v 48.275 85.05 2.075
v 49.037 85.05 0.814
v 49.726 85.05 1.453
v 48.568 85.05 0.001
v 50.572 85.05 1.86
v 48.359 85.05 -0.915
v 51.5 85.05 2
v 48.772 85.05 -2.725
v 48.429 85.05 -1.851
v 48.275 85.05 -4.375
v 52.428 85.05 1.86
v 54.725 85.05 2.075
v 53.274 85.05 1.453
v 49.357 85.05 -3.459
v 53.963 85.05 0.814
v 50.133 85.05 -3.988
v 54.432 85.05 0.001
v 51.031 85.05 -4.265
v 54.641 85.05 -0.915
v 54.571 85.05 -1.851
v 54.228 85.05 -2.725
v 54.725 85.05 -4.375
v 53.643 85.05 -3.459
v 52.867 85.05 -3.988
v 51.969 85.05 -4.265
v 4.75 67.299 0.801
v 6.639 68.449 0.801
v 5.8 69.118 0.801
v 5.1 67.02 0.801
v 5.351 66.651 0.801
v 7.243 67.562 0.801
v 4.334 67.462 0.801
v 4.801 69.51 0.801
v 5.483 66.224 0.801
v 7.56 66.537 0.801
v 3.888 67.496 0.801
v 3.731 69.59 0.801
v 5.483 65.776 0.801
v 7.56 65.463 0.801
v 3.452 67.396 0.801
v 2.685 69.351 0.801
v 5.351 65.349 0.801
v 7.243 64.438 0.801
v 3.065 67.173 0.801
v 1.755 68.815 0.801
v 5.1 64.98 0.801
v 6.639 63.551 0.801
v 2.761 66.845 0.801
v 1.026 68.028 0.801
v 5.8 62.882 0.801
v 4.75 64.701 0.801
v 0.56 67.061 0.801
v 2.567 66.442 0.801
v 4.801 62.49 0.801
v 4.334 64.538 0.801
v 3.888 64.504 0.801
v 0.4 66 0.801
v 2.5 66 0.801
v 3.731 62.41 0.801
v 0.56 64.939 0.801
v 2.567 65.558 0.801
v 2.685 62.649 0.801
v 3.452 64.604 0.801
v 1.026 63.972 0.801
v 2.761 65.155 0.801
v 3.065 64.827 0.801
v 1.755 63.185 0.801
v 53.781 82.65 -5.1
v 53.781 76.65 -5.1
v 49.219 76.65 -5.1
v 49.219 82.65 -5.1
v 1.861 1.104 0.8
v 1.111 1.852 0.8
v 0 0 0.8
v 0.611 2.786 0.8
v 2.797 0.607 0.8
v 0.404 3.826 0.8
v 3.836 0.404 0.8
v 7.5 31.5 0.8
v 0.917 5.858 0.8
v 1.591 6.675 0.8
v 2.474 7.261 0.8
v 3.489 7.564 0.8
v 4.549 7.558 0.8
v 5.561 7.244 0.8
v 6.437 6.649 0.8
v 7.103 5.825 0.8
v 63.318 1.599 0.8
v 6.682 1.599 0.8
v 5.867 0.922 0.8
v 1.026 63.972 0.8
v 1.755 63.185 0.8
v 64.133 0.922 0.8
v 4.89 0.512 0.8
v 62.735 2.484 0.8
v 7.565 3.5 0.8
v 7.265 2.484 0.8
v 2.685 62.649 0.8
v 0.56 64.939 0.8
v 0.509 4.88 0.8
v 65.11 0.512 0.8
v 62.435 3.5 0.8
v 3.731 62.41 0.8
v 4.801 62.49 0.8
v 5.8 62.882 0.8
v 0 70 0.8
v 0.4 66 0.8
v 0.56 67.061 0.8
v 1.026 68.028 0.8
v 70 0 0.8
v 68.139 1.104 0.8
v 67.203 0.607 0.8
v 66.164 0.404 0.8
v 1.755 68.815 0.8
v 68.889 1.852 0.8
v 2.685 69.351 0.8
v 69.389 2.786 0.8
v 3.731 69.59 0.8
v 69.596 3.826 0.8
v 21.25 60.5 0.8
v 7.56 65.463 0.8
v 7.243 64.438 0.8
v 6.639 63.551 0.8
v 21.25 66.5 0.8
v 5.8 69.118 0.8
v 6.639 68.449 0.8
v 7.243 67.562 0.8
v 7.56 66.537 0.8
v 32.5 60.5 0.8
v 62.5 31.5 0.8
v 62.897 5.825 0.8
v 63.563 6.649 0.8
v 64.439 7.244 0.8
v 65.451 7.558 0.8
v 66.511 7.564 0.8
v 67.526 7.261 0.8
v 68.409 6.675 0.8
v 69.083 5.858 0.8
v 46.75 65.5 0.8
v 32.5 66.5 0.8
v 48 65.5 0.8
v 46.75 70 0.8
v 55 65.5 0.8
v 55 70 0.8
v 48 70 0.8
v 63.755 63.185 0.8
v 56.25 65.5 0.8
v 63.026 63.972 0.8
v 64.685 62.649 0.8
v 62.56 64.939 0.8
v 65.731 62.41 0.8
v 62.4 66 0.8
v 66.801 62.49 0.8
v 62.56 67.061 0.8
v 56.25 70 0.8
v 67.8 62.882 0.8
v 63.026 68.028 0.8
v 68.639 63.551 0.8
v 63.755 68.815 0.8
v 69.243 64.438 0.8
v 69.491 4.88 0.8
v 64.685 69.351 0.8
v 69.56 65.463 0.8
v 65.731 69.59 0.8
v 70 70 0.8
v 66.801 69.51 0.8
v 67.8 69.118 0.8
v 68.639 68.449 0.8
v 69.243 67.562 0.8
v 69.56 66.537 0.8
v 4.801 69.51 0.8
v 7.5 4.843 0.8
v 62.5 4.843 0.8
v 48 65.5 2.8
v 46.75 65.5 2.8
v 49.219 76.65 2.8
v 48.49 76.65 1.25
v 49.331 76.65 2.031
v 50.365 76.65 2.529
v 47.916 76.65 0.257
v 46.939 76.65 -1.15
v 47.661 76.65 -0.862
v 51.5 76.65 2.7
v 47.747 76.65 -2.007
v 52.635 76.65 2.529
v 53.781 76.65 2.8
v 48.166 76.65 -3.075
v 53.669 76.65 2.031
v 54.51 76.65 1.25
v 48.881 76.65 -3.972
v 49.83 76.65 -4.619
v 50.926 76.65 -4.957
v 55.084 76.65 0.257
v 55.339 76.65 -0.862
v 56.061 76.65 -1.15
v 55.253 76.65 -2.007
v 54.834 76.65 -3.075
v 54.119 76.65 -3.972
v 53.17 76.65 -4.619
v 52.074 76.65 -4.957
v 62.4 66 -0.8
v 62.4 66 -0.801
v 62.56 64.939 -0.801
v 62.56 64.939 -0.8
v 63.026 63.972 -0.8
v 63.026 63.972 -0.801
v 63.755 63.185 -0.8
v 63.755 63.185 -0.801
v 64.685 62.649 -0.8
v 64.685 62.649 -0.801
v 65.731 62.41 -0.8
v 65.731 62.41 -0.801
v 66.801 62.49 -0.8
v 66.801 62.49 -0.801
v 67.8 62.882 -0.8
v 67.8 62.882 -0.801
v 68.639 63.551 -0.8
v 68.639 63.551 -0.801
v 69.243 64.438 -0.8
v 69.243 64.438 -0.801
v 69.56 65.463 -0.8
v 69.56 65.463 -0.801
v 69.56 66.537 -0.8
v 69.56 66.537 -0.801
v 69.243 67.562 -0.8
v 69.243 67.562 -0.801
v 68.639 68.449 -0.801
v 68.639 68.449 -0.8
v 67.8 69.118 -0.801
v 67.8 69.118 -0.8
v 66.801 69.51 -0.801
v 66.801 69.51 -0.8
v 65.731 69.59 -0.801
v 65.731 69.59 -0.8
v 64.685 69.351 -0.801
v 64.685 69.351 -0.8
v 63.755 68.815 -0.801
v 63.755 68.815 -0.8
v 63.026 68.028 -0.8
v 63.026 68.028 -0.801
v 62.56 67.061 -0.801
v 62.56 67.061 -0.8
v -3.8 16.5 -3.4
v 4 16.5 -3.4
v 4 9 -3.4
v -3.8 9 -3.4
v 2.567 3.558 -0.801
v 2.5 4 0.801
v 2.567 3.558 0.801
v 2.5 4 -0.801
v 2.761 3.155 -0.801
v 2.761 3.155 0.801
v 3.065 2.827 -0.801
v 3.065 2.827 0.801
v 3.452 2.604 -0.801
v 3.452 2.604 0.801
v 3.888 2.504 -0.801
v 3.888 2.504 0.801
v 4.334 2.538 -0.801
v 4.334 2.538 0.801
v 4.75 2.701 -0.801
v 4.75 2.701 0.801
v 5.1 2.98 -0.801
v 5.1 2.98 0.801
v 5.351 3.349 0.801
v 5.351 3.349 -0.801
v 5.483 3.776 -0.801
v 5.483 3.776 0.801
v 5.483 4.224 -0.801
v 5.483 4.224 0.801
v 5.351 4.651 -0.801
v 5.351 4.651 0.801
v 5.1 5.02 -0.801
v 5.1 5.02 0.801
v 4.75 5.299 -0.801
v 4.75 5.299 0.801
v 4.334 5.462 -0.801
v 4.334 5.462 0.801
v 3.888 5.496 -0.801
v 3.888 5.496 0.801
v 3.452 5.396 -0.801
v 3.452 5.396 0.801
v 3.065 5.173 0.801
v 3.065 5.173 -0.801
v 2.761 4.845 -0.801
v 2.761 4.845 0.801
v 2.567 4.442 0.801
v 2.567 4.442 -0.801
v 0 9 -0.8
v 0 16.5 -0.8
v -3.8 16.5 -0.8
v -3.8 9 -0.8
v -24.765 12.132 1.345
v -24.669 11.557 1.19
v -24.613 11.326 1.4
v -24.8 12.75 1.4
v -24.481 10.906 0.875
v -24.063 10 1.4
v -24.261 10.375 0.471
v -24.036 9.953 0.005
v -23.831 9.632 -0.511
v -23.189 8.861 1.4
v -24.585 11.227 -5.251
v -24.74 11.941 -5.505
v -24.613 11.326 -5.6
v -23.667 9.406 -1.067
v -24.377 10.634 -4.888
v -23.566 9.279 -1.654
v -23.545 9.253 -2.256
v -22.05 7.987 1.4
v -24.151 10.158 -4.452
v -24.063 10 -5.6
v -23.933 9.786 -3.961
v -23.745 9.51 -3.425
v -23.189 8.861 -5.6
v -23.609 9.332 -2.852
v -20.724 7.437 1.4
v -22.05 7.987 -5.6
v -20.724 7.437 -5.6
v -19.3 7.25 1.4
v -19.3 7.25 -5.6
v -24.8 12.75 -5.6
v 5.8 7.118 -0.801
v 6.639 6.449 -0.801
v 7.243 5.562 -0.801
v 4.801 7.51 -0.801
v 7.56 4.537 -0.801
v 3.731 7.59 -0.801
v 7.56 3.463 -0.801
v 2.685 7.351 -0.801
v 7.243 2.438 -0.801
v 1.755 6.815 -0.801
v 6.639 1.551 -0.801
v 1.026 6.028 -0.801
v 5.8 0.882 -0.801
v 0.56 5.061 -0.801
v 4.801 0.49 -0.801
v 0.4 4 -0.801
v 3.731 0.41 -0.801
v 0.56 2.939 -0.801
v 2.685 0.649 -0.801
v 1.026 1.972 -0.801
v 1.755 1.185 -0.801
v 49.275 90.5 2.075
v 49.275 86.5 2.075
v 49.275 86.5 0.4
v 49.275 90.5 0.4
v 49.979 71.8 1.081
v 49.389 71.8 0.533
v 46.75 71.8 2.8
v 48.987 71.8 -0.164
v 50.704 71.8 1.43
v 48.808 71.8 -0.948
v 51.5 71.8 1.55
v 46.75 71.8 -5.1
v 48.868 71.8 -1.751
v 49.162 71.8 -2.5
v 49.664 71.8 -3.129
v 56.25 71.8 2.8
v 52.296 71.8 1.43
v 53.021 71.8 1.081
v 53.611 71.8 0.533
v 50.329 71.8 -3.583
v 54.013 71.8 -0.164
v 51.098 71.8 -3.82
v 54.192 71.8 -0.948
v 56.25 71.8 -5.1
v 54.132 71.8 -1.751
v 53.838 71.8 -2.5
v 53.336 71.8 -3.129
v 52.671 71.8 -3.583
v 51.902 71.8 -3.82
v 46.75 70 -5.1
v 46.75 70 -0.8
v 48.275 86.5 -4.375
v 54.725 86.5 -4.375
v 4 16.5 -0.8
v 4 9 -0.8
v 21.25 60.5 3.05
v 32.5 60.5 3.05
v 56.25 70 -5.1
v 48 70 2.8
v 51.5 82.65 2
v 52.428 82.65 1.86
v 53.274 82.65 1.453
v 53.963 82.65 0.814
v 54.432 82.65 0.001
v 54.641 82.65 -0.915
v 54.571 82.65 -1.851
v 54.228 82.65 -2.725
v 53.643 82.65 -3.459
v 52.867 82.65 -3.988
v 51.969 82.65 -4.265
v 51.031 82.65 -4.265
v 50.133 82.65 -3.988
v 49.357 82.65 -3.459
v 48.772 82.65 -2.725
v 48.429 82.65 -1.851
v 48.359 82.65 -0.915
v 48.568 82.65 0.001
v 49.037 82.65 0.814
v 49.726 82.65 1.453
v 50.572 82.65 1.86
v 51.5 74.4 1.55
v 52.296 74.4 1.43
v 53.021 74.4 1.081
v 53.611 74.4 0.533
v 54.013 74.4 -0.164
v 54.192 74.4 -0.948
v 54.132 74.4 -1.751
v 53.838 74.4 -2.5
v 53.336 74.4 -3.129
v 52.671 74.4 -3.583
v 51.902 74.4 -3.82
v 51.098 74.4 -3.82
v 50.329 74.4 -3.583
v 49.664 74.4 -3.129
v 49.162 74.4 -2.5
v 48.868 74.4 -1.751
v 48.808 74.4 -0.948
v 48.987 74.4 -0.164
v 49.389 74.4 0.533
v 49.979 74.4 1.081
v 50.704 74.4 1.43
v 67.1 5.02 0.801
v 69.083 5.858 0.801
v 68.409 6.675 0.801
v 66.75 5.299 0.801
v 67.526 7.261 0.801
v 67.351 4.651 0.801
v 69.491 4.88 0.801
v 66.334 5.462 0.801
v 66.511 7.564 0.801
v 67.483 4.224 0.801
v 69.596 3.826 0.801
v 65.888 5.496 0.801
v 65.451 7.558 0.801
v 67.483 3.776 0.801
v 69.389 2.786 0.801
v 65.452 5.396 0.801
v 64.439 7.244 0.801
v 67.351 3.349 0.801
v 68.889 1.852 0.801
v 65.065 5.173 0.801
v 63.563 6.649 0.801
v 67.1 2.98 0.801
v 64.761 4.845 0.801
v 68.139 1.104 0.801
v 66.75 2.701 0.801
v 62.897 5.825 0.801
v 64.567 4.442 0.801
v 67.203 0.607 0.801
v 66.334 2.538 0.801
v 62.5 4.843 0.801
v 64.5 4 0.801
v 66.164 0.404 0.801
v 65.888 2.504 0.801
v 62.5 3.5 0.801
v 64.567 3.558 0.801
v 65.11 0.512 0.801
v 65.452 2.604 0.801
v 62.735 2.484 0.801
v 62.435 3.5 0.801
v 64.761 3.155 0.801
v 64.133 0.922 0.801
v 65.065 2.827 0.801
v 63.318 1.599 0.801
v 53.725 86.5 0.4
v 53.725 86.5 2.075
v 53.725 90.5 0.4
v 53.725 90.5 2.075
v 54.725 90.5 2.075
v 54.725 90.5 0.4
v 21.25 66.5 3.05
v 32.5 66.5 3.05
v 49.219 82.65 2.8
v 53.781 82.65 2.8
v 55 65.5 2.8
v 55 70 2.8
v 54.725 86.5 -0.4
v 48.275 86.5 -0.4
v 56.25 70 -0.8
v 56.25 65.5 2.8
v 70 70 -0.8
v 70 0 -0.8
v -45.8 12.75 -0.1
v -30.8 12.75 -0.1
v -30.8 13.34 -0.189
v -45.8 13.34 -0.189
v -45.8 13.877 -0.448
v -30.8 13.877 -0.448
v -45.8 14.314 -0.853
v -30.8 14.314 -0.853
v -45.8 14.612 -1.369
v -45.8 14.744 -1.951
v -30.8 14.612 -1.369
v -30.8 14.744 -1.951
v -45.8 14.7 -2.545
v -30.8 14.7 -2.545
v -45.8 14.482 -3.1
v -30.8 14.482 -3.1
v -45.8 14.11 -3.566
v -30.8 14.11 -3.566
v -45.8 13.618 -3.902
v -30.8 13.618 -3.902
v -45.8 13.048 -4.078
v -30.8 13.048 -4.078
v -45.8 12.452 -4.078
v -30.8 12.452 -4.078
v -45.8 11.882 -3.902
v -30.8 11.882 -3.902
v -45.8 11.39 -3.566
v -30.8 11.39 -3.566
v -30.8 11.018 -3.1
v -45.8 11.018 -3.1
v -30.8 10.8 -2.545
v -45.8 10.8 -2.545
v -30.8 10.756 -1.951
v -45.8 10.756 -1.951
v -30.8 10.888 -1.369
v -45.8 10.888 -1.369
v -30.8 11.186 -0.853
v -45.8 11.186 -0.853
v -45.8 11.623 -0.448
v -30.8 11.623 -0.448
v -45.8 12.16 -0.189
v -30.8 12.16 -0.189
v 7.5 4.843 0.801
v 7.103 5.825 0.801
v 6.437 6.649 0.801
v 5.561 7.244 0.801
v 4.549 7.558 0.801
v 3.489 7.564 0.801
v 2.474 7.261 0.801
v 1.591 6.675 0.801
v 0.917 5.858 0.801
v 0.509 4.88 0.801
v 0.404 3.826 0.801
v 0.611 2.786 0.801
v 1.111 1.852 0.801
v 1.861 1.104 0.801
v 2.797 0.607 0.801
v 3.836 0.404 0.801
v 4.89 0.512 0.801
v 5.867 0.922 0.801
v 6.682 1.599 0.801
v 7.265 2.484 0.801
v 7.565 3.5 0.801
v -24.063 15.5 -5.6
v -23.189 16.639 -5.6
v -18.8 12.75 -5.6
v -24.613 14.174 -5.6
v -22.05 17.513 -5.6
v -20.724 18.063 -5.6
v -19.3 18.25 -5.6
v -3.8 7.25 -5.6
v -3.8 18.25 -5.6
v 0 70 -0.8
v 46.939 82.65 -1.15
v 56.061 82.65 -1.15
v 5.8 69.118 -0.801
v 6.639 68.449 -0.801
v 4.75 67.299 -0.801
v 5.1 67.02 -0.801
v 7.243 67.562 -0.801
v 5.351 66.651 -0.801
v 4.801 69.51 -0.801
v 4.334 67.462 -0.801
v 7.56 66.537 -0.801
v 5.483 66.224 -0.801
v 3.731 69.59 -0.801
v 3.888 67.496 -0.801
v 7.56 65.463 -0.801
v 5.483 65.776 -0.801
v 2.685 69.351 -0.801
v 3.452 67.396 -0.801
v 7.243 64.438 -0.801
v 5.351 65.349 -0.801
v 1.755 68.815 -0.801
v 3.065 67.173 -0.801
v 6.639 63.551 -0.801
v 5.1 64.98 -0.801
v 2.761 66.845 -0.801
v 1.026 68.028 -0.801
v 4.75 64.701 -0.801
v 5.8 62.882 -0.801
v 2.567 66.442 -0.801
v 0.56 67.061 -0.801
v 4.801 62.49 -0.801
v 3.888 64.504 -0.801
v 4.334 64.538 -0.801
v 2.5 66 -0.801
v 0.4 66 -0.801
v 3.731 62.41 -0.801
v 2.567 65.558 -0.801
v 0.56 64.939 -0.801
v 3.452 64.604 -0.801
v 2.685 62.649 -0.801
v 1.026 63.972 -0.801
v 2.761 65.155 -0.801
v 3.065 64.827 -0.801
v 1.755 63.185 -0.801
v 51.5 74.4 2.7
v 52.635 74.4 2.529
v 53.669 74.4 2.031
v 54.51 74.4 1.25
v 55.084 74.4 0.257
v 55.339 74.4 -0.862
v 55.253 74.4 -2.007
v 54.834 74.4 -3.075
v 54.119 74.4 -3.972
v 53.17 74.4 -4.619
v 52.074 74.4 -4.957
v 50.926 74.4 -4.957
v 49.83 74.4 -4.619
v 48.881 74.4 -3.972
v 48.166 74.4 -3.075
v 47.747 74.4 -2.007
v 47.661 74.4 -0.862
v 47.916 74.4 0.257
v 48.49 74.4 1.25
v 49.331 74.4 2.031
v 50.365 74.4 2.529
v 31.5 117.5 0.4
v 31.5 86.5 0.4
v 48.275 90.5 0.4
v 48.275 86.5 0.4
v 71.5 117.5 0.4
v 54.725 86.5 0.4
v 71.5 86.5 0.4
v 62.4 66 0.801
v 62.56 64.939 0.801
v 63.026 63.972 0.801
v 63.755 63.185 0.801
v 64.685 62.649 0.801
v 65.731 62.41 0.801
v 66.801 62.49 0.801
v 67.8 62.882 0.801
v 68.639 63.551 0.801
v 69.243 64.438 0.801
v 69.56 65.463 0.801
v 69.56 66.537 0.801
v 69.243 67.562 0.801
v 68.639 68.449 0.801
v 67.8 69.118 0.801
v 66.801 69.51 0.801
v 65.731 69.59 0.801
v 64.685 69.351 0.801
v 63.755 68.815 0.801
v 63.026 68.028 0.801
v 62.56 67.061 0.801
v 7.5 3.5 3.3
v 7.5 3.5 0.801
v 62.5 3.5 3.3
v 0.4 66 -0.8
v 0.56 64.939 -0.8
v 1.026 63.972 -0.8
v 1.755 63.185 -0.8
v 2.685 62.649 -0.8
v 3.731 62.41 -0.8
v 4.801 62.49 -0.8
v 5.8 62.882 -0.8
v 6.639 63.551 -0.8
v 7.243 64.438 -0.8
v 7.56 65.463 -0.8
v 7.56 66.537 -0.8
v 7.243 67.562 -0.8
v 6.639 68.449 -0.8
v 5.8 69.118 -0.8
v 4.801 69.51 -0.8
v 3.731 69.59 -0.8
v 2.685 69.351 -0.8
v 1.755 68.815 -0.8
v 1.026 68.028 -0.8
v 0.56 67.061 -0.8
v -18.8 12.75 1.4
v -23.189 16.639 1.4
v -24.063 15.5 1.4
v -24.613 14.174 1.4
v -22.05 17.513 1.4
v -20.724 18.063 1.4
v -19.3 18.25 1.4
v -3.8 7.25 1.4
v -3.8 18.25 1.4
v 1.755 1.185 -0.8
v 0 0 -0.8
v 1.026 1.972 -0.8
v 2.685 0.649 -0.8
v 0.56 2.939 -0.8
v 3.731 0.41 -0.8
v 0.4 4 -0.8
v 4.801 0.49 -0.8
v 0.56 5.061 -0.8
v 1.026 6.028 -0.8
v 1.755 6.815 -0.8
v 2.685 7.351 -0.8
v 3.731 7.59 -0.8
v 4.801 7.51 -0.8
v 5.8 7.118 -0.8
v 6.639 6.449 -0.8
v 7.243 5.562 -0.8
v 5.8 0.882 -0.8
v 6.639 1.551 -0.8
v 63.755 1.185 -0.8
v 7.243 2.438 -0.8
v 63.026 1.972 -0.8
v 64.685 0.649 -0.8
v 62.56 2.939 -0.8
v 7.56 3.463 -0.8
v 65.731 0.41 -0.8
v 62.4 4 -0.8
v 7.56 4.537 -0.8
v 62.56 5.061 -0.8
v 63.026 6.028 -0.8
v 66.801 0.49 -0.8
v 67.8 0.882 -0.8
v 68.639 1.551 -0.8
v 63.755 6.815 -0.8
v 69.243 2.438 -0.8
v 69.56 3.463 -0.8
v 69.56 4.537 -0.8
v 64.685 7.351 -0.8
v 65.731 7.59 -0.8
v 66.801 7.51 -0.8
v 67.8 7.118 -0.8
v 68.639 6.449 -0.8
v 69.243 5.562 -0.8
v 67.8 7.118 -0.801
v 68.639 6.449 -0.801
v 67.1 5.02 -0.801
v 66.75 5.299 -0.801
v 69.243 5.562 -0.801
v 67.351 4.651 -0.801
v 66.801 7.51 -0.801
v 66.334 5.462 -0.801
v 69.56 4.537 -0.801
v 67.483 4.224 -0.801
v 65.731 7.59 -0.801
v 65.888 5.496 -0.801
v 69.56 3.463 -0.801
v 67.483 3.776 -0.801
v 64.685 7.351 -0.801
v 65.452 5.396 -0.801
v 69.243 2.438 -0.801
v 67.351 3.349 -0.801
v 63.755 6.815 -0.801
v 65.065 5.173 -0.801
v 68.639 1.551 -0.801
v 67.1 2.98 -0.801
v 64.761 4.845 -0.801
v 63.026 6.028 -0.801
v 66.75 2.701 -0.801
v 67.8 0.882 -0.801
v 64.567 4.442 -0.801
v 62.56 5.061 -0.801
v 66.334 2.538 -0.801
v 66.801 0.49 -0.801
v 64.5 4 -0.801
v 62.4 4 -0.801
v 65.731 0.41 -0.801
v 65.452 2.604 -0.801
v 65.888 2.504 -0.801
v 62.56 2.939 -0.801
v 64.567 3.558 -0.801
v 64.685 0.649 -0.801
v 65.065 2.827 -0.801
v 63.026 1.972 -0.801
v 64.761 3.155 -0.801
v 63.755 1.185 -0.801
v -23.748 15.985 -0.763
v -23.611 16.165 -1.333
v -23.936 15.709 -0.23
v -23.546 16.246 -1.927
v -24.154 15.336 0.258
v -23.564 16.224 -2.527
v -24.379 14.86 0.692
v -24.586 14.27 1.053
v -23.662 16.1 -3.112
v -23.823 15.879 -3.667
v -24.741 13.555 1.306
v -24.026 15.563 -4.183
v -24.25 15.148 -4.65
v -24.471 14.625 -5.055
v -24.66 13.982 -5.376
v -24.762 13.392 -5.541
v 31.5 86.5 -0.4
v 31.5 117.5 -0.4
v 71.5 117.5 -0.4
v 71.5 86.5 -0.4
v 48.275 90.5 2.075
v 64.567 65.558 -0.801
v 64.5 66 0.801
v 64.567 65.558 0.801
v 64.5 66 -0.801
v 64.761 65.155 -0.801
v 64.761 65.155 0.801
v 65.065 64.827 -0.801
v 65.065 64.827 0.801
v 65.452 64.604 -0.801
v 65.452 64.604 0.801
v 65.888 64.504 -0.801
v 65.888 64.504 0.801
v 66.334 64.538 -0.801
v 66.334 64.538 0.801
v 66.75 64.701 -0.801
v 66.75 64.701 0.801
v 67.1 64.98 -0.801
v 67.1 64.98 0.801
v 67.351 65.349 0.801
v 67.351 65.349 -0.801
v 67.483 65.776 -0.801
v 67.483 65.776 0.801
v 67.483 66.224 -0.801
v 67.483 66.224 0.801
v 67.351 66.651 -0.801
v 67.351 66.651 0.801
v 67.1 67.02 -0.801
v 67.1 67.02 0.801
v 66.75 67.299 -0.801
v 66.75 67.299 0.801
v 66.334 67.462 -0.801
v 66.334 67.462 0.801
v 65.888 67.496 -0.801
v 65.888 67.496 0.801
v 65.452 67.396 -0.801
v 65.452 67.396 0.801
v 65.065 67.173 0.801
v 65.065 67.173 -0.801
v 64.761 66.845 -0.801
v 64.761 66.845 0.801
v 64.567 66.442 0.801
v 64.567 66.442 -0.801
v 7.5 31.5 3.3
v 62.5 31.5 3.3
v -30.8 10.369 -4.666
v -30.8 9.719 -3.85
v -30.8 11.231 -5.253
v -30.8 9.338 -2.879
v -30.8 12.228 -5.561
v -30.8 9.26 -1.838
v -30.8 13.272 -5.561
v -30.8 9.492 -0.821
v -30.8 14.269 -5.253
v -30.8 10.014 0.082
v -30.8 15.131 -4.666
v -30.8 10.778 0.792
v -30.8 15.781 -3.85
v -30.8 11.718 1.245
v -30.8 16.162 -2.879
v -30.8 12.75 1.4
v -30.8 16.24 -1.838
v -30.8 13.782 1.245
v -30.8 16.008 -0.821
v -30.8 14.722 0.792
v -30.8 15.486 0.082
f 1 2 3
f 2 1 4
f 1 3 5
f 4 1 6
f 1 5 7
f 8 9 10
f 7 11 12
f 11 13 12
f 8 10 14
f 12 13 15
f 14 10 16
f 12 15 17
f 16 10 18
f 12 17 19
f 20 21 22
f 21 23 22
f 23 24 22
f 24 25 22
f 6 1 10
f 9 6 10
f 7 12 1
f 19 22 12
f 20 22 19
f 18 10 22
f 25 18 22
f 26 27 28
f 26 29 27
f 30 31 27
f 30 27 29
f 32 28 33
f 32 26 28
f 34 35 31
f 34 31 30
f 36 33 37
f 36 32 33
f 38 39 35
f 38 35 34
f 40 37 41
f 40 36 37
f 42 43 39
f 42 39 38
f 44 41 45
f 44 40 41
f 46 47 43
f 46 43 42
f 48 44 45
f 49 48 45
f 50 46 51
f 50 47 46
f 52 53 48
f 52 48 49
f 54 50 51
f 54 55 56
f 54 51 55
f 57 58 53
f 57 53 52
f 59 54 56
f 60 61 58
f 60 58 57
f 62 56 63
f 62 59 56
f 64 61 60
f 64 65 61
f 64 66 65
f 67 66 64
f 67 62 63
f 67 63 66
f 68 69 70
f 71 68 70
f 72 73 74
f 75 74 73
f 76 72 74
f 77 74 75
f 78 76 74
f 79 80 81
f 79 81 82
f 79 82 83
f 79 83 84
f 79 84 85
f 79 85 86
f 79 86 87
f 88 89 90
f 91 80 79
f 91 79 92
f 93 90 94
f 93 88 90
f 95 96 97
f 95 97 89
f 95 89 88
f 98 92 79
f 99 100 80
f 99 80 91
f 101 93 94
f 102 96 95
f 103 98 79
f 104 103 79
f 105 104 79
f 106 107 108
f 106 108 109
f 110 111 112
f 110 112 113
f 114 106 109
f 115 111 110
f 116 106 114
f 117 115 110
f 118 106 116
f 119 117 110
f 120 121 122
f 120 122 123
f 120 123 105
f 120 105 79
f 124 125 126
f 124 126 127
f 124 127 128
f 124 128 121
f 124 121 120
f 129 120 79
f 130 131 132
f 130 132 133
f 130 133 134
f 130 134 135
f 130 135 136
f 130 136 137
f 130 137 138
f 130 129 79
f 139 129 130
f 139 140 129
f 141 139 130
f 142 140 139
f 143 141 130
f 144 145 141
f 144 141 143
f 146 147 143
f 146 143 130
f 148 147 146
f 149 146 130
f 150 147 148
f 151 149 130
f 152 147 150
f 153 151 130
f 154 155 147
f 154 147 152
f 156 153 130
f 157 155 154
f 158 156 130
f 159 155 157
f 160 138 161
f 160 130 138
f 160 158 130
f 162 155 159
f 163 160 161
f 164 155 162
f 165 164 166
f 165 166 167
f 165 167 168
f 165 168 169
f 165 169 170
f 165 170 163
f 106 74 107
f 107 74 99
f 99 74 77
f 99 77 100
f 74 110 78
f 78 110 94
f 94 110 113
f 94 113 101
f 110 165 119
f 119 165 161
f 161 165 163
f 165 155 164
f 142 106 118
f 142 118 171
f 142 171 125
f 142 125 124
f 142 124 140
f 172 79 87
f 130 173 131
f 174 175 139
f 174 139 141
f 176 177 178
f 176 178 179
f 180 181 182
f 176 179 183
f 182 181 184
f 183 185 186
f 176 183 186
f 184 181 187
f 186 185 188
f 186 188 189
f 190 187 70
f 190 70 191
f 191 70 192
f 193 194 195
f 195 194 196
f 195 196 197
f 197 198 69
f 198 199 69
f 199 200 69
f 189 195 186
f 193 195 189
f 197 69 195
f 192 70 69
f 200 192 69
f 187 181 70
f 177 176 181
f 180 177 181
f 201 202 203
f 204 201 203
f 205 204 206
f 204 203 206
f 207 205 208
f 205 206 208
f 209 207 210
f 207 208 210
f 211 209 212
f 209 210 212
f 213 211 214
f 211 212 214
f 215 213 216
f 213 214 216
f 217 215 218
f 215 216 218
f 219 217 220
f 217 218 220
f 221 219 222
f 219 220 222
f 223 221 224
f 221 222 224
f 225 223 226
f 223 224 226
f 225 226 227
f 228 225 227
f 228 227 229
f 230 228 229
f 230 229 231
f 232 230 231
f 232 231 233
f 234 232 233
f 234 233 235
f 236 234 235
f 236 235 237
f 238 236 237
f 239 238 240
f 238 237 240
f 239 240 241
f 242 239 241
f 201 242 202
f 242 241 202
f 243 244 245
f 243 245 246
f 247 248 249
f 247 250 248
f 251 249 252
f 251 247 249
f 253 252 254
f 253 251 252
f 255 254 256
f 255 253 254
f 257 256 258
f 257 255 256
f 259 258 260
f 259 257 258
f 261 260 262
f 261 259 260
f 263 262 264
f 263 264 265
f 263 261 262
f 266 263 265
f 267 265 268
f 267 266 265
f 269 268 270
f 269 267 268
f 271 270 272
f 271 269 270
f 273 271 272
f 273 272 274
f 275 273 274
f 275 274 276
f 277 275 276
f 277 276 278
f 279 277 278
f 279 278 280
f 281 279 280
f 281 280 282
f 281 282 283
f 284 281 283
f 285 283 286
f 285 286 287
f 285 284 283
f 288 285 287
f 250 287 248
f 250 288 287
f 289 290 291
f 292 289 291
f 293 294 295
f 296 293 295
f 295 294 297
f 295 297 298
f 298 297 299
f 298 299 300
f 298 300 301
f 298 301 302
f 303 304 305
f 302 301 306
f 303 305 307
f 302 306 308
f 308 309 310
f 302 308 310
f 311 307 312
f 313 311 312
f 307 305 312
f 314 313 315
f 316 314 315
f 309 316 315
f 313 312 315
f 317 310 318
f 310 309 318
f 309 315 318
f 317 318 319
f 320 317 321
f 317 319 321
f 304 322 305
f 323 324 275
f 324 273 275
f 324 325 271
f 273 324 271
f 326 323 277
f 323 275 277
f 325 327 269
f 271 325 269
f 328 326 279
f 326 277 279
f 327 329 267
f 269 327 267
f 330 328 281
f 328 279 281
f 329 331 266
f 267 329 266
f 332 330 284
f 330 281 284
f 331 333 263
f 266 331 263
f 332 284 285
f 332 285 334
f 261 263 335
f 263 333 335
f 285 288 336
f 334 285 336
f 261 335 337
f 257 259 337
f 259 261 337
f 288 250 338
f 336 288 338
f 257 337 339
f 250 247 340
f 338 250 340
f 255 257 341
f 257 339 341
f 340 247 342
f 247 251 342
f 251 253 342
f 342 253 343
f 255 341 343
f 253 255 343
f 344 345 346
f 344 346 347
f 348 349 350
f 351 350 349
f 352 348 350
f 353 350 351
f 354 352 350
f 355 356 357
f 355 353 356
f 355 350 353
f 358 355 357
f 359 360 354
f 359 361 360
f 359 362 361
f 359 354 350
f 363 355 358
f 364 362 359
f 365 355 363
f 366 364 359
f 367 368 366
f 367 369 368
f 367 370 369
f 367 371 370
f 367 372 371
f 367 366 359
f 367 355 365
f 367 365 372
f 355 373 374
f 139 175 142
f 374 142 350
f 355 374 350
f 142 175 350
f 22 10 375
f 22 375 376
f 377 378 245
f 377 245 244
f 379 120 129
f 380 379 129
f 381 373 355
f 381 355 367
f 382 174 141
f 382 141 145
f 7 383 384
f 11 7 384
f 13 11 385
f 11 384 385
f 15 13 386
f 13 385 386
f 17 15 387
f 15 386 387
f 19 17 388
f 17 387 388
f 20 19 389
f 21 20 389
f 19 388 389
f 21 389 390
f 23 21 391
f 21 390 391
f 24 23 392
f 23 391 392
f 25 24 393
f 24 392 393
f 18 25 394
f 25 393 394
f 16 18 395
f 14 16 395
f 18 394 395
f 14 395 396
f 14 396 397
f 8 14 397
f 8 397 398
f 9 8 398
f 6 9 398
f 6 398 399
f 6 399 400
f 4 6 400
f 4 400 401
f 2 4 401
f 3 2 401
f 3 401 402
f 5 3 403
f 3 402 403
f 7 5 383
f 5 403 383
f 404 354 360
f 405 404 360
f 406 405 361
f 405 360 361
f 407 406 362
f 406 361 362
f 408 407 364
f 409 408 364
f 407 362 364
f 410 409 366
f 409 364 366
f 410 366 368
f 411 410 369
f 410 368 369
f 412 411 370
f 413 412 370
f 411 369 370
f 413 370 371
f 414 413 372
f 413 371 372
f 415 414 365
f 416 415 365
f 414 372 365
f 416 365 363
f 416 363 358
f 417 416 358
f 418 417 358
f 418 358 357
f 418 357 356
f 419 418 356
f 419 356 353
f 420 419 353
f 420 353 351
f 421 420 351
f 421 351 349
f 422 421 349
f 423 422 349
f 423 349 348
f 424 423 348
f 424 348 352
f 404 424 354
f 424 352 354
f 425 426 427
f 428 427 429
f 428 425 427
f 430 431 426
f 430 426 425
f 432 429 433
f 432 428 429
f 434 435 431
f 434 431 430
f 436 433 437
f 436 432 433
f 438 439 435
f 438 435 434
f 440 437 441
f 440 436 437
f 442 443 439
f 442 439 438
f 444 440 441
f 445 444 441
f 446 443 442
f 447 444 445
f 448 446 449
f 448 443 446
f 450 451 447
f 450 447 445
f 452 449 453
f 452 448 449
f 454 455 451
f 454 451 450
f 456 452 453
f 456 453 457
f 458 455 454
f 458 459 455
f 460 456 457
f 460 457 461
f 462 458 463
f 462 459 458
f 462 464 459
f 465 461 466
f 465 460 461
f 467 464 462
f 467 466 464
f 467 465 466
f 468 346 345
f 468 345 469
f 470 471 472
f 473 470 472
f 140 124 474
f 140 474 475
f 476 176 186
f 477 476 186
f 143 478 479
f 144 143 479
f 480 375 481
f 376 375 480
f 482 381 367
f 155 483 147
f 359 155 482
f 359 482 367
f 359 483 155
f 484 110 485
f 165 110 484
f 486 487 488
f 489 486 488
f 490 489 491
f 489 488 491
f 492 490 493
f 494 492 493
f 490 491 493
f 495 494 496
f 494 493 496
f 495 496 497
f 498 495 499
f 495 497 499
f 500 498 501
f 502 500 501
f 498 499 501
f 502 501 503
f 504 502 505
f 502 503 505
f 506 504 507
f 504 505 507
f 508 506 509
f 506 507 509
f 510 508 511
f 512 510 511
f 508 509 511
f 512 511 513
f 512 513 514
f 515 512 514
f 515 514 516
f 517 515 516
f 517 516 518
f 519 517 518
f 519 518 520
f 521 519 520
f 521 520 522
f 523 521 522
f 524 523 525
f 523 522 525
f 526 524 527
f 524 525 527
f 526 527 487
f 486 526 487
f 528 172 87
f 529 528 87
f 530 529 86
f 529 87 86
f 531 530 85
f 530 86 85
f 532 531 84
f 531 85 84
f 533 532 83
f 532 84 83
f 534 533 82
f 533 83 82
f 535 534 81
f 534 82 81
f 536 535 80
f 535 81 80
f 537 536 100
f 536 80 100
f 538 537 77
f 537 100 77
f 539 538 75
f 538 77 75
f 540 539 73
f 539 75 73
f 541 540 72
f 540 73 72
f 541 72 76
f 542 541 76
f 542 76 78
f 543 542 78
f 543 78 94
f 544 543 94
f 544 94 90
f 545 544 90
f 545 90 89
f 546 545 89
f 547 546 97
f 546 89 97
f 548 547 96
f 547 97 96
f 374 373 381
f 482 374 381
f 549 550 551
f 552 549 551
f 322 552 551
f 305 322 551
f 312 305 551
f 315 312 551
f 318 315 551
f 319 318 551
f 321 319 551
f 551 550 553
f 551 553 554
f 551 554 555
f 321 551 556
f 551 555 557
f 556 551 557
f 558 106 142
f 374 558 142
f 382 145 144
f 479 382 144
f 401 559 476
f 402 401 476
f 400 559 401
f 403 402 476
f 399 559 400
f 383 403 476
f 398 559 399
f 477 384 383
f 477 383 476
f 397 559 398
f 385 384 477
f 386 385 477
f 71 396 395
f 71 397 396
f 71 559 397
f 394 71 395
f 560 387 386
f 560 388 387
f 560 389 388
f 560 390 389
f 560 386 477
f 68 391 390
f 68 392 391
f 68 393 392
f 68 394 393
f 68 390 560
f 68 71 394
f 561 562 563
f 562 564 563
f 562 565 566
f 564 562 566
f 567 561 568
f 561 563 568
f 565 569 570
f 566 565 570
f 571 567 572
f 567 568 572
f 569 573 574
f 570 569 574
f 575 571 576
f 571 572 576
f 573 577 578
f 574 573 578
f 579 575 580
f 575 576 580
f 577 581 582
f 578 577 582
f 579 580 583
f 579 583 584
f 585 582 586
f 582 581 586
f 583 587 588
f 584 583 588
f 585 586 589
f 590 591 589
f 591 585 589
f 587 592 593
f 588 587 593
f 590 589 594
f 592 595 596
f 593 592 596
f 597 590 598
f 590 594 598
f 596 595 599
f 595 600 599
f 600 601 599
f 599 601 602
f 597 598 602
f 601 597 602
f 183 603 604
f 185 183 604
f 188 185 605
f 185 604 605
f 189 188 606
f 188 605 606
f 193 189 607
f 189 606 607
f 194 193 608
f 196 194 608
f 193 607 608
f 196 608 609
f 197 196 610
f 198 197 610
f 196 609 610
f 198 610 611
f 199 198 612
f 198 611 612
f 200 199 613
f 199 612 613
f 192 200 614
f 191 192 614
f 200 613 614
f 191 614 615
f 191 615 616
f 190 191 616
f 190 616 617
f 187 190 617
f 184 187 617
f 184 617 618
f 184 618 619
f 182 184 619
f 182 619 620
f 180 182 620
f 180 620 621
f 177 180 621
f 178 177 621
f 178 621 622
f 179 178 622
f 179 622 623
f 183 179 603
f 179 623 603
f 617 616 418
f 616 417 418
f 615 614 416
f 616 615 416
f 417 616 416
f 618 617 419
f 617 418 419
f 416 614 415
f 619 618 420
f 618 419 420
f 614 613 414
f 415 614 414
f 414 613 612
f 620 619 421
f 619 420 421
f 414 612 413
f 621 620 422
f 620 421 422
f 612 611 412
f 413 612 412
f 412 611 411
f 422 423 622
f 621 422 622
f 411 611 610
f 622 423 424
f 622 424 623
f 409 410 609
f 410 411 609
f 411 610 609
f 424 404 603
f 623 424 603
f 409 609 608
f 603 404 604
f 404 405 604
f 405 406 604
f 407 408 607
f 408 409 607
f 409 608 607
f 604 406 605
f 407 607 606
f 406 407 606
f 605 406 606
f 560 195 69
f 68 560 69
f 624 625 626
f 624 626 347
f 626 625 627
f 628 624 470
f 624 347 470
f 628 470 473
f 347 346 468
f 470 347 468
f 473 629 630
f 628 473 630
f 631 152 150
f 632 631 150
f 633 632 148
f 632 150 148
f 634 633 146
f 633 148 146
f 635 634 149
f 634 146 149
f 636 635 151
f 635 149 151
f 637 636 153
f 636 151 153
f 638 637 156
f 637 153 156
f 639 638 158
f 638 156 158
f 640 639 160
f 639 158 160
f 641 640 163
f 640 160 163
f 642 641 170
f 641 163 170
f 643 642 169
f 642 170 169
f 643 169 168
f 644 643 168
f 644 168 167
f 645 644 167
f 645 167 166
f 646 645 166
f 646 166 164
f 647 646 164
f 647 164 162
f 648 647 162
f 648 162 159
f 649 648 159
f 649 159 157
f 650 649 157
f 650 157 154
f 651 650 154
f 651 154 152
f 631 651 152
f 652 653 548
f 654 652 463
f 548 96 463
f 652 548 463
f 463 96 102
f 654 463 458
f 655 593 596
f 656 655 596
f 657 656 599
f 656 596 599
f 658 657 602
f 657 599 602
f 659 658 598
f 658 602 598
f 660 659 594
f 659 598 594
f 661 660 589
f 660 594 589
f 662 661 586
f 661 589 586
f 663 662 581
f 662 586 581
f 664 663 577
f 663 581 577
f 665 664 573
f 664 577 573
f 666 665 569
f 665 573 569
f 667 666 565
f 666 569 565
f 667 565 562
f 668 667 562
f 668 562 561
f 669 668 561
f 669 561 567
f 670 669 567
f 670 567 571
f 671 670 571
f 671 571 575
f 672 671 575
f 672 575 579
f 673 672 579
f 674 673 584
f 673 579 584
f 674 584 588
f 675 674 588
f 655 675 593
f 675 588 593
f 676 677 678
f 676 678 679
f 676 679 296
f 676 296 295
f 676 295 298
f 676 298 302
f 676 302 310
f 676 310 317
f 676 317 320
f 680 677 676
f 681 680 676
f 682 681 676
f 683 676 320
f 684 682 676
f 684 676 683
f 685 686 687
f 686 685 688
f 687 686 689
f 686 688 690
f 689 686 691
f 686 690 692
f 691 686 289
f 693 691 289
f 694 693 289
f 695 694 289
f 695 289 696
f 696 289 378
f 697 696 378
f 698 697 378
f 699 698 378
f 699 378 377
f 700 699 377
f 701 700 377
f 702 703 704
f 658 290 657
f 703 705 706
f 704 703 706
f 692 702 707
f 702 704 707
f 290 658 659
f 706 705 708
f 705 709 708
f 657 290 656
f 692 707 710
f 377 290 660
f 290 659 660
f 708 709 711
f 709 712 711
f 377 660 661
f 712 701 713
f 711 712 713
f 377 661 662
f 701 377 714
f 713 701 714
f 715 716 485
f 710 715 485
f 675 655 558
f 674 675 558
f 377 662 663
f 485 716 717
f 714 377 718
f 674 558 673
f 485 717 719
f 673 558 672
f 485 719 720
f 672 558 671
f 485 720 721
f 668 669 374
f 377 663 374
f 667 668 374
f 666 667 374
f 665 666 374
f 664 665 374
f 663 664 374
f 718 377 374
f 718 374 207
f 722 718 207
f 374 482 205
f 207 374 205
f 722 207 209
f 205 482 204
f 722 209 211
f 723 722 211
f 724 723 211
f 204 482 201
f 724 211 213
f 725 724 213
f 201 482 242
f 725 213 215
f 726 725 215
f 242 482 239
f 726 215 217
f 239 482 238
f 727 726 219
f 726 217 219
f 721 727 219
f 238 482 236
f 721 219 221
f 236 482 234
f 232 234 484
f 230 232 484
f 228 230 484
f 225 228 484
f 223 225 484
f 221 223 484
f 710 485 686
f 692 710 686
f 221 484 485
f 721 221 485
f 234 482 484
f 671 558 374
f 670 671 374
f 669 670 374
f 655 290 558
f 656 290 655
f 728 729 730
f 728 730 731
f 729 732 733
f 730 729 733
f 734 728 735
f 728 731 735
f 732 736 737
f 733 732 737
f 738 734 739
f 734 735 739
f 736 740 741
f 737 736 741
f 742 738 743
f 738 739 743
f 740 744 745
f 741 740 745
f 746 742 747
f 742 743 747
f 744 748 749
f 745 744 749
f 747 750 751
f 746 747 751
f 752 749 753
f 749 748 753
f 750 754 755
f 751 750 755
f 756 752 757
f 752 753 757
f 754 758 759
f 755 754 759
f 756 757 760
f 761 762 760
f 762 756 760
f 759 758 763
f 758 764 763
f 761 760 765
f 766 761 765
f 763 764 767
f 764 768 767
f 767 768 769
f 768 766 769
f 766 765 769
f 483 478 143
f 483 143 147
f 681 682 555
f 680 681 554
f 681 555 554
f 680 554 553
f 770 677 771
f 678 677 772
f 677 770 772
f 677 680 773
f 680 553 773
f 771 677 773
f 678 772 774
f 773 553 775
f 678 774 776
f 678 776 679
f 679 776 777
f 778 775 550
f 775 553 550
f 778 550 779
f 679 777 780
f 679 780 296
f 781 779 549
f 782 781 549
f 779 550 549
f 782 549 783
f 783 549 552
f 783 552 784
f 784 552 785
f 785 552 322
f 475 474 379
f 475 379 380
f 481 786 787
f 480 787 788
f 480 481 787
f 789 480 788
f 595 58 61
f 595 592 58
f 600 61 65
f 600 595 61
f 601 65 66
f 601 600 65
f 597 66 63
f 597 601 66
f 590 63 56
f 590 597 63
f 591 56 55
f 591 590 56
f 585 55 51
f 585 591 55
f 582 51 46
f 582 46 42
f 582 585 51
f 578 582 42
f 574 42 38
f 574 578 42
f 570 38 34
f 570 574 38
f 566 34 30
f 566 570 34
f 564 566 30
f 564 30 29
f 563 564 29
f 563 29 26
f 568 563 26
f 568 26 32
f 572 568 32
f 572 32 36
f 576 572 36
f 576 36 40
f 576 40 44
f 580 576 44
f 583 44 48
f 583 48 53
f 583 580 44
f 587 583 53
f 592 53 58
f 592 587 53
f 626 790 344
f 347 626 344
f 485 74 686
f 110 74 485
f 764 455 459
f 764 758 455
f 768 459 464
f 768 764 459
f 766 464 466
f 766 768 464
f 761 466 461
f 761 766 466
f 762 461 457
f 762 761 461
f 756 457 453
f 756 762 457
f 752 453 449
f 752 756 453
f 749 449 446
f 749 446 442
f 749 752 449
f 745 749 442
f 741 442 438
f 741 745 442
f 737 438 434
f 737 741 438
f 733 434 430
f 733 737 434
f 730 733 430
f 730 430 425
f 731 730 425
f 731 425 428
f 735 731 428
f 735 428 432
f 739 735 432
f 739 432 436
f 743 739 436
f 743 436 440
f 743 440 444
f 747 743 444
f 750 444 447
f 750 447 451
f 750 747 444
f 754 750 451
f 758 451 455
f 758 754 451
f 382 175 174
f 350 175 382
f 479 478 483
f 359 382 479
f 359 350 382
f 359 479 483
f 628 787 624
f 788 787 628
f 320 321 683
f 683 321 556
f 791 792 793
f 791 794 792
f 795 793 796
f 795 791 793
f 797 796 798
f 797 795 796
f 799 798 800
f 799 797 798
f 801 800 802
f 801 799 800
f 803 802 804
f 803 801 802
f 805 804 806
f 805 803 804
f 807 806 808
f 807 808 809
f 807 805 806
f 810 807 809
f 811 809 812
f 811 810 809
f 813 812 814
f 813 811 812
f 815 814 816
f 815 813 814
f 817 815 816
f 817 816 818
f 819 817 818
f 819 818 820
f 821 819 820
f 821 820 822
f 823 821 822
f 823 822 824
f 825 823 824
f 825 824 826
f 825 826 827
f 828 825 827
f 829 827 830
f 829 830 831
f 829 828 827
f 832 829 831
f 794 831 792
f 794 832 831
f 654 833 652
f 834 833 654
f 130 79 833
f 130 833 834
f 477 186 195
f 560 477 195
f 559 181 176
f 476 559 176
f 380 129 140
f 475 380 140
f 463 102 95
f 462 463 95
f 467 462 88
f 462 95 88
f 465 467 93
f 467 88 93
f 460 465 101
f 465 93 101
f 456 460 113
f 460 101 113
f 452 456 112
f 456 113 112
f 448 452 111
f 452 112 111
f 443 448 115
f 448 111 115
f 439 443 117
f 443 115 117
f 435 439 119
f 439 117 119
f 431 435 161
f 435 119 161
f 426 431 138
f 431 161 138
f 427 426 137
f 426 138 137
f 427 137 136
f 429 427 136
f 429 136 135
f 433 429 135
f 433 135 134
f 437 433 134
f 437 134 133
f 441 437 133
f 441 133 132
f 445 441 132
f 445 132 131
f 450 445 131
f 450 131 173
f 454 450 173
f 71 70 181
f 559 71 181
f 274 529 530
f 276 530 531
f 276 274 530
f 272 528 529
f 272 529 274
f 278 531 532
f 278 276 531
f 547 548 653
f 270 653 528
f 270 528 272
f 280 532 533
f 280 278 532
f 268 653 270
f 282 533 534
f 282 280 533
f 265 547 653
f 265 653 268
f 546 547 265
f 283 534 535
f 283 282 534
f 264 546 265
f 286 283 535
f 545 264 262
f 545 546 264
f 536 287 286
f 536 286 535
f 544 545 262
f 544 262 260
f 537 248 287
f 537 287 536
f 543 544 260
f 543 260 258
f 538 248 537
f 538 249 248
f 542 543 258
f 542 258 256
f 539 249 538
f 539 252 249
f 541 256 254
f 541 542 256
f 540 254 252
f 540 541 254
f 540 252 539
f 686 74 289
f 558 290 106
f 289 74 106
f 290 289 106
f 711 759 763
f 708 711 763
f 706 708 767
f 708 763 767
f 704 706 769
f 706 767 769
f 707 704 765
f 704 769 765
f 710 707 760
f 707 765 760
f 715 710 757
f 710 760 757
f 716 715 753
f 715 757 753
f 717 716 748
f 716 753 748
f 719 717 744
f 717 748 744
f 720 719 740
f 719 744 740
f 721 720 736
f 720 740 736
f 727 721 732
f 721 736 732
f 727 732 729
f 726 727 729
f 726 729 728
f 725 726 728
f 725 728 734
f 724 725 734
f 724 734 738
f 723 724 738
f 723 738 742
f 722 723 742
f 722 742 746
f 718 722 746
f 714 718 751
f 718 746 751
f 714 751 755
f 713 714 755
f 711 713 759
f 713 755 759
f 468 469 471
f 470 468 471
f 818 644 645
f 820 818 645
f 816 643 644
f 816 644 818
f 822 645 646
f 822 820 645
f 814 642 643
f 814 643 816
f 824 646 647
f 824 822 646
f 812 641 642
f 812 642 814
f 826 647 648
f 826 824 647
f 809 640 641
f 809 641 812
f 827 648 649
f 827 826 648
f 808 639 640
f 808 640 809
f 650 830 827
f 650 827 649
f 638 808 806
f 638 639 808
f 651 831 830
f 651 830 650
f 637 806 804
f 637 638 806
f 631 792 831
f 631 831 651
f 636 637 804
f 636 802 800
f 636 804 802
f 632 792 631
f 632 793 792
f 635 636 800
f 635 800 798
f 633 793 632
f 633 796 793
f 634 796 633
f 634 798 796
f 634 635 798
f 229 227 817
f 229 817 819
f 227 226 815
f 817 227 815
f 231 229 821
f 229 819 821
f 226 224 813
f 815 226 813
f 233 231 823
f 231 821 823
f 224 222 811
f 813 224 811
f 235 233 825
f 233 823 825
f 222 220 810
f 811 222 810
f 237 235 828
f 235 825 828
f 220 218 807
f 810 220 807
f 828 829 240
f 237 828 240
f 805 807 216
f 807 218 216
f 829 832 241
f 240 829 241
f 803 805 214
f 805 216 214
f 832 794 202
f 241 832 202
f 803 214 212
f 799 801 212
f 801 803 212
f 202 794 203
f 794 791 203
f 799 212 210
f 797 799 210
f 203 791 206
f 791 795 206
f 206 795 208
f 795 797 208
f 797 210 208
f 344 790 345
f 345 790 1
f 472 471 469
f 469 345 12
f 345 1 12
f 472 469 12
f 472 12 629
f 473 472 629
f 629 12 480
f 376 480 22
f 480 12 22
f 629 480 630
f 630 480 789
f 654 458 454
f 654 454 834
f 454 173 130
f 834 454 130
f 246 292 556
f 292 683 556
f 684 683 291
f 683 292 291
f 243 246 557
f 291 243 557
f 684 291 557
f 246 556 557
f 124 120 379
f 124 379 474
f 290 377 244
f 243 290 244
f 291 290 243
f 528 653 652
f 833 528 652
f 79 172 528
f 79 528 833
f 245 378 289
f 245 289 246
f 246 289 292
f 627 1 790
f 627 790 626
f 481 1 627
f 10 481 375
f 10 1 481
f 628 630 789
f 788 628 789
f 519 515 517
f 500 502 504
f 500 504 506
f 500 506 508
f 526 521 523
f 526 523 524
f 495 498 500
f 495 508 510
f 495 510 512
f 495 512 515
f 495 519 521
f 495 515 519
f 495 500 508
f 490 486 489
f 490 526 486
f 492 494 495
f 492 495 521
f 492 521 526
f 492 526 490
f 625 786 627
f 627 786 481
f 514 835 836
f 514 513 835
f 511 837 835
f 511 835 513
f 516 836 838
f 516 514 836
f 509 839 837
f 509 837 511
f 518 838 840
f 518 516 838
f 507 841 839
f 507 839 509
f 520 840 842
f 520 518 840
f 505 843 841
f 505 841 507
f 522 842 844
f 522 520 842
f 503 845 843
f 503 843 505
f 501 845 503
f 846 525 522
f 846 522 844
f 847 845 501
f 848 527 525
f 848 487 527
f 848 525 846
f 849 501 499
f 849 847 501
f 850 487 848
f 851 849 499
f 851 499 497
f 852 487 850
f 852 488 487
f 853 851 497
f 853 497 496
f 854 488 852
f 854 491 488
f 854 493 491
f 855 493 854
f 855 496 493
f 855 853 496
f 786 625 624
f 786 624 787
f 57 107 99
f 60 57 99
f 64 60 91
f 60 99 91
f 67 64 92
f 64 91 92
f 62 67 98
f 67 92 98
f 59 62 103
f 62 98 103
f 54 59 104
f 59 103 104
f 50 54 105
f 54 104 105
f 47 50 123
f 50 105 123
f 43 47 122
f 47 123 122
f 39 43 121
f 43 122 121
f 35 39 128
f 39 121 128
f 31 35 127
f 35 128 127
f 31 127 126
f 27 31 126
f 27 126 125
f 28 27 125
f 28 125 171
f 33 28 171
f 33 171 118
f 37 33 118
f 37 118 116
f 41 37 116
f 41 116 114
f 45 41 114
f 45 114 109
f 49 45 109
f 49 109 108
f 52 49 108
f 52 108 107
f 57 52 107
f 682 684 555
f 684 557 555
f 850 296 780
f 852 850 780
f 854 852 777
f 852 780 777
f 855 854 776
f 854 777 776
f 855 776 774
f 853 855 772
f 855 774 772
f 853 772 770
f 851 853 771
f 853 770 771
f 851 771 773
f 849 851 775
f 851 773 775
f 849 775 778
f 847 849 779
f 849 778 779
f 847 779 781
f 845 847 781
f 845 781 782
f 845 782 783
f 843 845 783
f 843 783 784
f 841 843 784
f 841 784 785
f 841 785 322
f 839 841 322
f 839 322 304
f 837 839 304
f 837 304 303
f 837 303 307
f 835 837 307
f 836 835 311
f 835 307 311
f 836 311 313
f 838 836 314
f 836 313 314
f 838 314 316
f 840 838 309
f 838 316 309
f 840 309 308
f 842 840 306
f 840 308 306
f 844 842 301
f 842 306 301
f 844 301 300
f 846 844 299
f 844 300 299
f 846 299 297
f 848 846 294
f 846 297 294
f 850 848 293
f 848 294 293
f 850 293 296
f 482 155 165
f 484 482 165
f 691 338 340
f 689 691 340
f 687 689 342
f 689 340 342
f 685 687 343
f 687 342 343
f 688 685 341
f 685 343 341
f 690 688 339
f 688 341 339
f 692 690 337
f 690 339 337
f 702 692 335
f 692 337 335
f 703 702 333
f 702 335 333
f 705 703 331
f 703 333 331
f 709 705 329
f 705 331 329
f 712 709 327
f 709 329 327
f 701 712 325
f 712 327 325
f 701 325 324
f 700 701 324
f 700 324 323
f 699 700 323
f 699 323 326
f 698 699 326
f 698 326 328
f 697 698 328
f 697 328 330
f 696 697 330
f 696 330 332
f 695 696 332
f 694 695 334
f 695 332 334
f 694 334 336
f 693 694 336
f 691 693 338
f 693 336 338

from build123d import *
from build123d.topology import SkipClean

# Parameters (mm, degrees)
SKETCH1_W                     = 70
SKETCH1_H                     = 70
GREEN_PCB_DEPTH               = 0.8
SKETCH2_R                     = 1.5
MOUNTING_HOLES_DEPTH          = 100.007878474
SCREW_GROUNDS_DEPTH           = 0.801
SCREW_GROUNDS_DEPTH_BACK      = 0.801
SKETCH3_R                     = 3.6
SKETCH3_R_2                   = 1.5
SKETCH4_W                     = 9.5
SKETCH4_H                     = 7.9
ANTENNA1_DEPTH                = 1.8
SKETCH10_W                    = 1.25
SKETCH10_H                    = 4.5
ANTENNA2_DEPTH                = 2
SKETCH5_R                     = 2.7
ANTENNA3_DEPTH                = 2.6
SKETCH6_R                     = 3.85
ANTENNA4_DEPTH                = 2.25
ANTENNA5_DEPTH                = 6
SKETCH8_R                     = 3.15
ANTENNA6_DEPTH                = 2.4
SKETCH9_W                     = 6.45
SKETCH9_H                     = 6.45
ANTENNA7_DEPTH                = 1.45
SKETCH11_W                    = 40
SKETCH11_H                    = 0.8
ANTENNA_PCB_DEPTH             = 31
SKETCH19_W                    = 1
SKETCH19_H                    = 4
ANTENNA8_DEPTH                = 1.675
SKETCH12_W                    = 55
SKETCH12_H                    = 28
LCD_DEPTH                     = 2.5
SKETCH13_W                    = 11.25
SKETCH13_H                    = 6
OPTION_SWITCH_DEPTH           = 2.25
SKETCH14_W                    = 7.8
SKETCH14_H                    = 7.5
USB_PORT_DEPTH                = 2.6
USB_BODY_DEPTH                = 3.5
USB_TENSION_RELIEF_DEPTH      = 6
USB_TENSION_RELIEF_DEPTH_BACK = 6
SKETCH17_R                    = 3.5
SKETCH18_R                    = 2
USB_CORD_DEPTH                = 15


with BuildPart() as part:
    # Sketch1 → Green PCB (new, symmetric)
    with BuildSketch(Plane.XY):
        with Locations((35, 35)):
            Rectangle(SKETCH1_W, SKETCH1_H)
    extrude(amount=GREEN_PCB_DEPTH, both=True)

    # Sketch2 → Mounting Holes (cut, through all)
    with BuildSketch(Plane.XY.offset(0.8)):
        with Locations((4, 4)):
            Circle(SKETCH2_R)
        with Locations((66, 4)):
            Circle(SKETCH2_R)
        with Locations((66, 66)):
            Circle(SKETCH2_R)
        with Locations((4, 66)):
            Circle(SKETCH2_R)
    extrude(amount=-MOUNTING_HOLES_DEPTH, mode=Mode.SUBTRACT)

    # Sketch3 → Screw Grounds (add, two sides: drawn at the far end of the back side and taken through both)
    # profile 1 of 4: a face of its own
    with BuildSketch(Plane.XY.offset(-SCREW_GROUNDS_DEPTH_BACK)):
        with Locations(Location((4, 66, 0), (0, 0, 180))):
            Circle(SKETCH3_R)
        with Locations(Location((4, 66, 0), (0, 0, 180))):
            Circle(SKETCH3_R_2, mode=Mode.SUBTRACT)
    # profile 2 of 4: a face of its own
    with BuildSketch(Plane.XY.offset(-SCREW_GROUNDS_DEPTH_BACK)):
        with Locations(Location((66, 66, 0), (0, 0, 180))):
            Circle(SKETCH3_R)
        with Locations(Location((66, 66, 0), (0, 0, 180))):
            Circle(SKETCH3_R_2, mode=Mode.SUBTRACT)
    # profile 3 of 4: a face of its own
    with BuildSketch(Plane.XY.offset(-SCREW_GROUNDS_DEPTH_BACK)):
        with Locations(Location((66, 4, 0), (0, 0, 180))):
            Circle(SKETCH3_R)
        with Locations(Location((66, 4, 0), (0, 0, 180))):
            Circle(SKETCH3_R_2, mode=Mode.SUBTRACT)
    # profile 4 of 4: a face of its own
    with BuildSketch(Plane.XY.offset(-SCREW_GROUNDS_DEPTH_BACK)):
        with Locations(Location((4, 4, 0), (0, 0, 180))):
            Circle(SKETCH3_R)
        with Locations(Location((4, 4, 0), (0, 0, 180))):
            Circle(SKETCH3_R_2, mode=Mode.SUBTRACT)
    extrude(amount=SCREW_GROUNDS_DEPTH + SCREW_GROUNDS_DEPTH_BACK)

    # Sketch4 → Antenna1 (add)
    with BuildSketch(Plane(origin=(0, 70, 0), x_dir=(1, 0, 0), z_dir=(0, 1, 0))):
        with Locations((51.5, 1.15)):
            Rectangle(SKETCH4_W, SKETCH4_H)
    extrude(amount=ANTENNA1_DEPTH)

    # Sketch10 → Antenna2 (add)
    with BuildSketch(Plane.XY.offset(2.8)):
        with Locations((47.375, 67.75)):
            Rectangle(SKETCH10_W, SKETCH10_H)
        with Locations((55.625, 67.75)):
            Rectangle(SKETCH10_W, SKETCH10_H)
    extrude(amount=-ANTENNA2_DEPTH)

    # Sketch5 → Antenna3 (add)
    with BuildSketch(Plane(origin=(0, 71.8, 0), x_dir=(1, 0, 0), z_dir=(0, 1, 0))):
        with Locations(Location((51.5, 1.15, 0), (0, 0, 270))):
            Circle(SKETCH5_R)
    extrude(amount=ANTENNA3_DEPTH)

    # Sketch6 → Antenna4 (add)
    with SkipClean():  # the faces are left unmerged after this step: merging them gives an invalid solid
        with BuildSketch(Plane(origin=(0, 74.4, 0), x_dir=(1, 0, 0), z_dir=(0, 1, 0))):
            with Locations(Location((51.5, 1.15, 0), (0, 0, 270))):
                Circle(SKETCH6_R)
        extrude(amount=ANTENNA4_DEPTH)

    # Sketch7 → Antenna5 (add)
    with SkipClean():  # the faces are left unmerged after this step: merging them gives an invalid solid
        with BuildSketch(Plane(origin=(0, 76.65, 0), x_dir=(1, 0, 0), z_dir=(0, 1, 0))):
            Polygon((49.219466437, -2.8), (53.780533563, -2.8), (56.061067127, 1.15), (53.780533563, 5.1), (49.219466437, 5.1), (46.938932873, 1.15), align=None)
        extrude(amount=ANTENNA5_DEPTH)

    # Sketch8 → Antenna6 (add)
    with SkipClean():  # the faces are left unmerged after this step: merging them gives an invalid solid
        with BuildSketch(Plane(origin=(0, 82.65, 0), x_dir=(1, 0, 0), z_dir=(0, 1, 0))):
            with Locations(Location((51.5, 1.15, 0), (0, 0, 270))):
                Circle(SKETCH8_R)
        extrude(amount=ANTENNA6_DEPTH)

    # Sketch9 → Antenna7 (add)
    with SkipClean():  # the faces are left unmerged after this step: merging them gives an invalid solid
        with BuildSketch(Plane(origin=(0, 85.05, 0), x_dir=(1, 0, 0), z_dir=(0, 1, 0))):
            with Locations((51.5, 1.15)):
                Rectangle(SKETCH9_W, SKETCH9_H)
        extrude(amount=ANTENNA7_DEPTH)

    # Sketch11 → Antenna PCB (add)
    with SkipClean():  # the faces are left unmerged after this step: merging them gives an invalid solid
        with BuildSketch(Plane(origin=(0, 86.5, 0), x_dir=(1, 0, 0), z_dir=(0, 1, 0))):
            with Locations((51.5, 0)):
                Rectangle(SKETCH11_W, SKETCH11_H)
        extrude(amount=ANTENNA_PCB_DEPTH)

    # Sketch19 → Antenna8 (add)
    with SkipClean():  # the faces are left unmerged after this step: merging them gives an invalid solid
        with BuildSketch(Plane.XY.offset(2.075)):
            with Locations((48.775, 88.5)):
                Rectangle(SKETCH19_W, SKETCH19_H)
            with Locations((54.225, 88.5)):
                Rectangle(SKETCH19_W, SKETCH19_H)
        extrude(amount=-ANTENNA8_DEPTH)

    # Sketch12 → LCD (add)
    with SkipClean():  # the faces are left unmerged after this step: merging them gives an invalid solid
        with BuildSketch(Plane.XY.offset(0.8)):
            with Locations((35, 17.5)):
                Rectangle(SKETCH12_W, SKETCH12_H)
        extrude(amount=LCD_DEPTH)

    # Sketch13 → Option Switch (add)
    with SkipClean():  # the faces are left unmerged after this step: merging them gives an invalid solid
        with BuildSketch(Plane.XY.offset(0.8)):
            with Locations((26.875, 63.5)):
                Rectangle(SKETCH13_W, SKETCH13_H)
        extrude(amount=OPTION_SWITCH_DEPTH)

    # Sketch14 → USB Port (add)
    with SkipClean():  # the faces are left unmerged after this step: merging them gives an invalid solid
        with BuildSketch(Plane(origin=(0, 0, -0.8), x_dir=(-1, 0, 0), z_dir=(0, 0, -1))):
            with Locations((-0.1, 12.75)):
                Rectangle(SKETCH14_W, SKETCH14_H)
        extrude(amount=USB_PORT_DEPTH)

    # Sketch16 → USB Body (add, symmetric)
    with BuildSketch(Plane(origin=(0, 0, -2.1), x_dir=(-1, 0, 0), z_dir=(0, 0, -1))):
        with BuildLine():
            Line((19.3, 7.25), (3.8, 7.25))
            Line((3.8, 7.25), (3.8, 18.25))
            Line((3.8, 18.25), (19.3, 18.25))
            ThreePointArc((19.3, 18.25), (24.8, 12.75), (19.3, 7.25))
        make_face()
    extrude(amount=USB_BODY_DEPTH, both=True)

    # Sketch17 → USB Tension Relief (add, two sides: drawn at the far end of the back side and taken through both)
    with BuildSketch(Plane.ZY.offset(24.8).offset(-USB_TENSION_RELIEF_DEPTH_BACK)):
        with Locations((-2.1, 12.75)):
            Circle(SKETCH17_R)
    extrude(amount=USB_TENSION_RELIEF_DEPTH + USB_TENSION_RELIEF_DEPTH_BACK)

    # Sketch18 → USB Cord (add)
    with BuildSketch(Plane.ZY.offset(30.8)):
        with Locations((-2.1, 12.75)):
            Circle(SKETCH18_R)
    extrude(amount=USB_CORD_DEPTH)


solid = part.part
